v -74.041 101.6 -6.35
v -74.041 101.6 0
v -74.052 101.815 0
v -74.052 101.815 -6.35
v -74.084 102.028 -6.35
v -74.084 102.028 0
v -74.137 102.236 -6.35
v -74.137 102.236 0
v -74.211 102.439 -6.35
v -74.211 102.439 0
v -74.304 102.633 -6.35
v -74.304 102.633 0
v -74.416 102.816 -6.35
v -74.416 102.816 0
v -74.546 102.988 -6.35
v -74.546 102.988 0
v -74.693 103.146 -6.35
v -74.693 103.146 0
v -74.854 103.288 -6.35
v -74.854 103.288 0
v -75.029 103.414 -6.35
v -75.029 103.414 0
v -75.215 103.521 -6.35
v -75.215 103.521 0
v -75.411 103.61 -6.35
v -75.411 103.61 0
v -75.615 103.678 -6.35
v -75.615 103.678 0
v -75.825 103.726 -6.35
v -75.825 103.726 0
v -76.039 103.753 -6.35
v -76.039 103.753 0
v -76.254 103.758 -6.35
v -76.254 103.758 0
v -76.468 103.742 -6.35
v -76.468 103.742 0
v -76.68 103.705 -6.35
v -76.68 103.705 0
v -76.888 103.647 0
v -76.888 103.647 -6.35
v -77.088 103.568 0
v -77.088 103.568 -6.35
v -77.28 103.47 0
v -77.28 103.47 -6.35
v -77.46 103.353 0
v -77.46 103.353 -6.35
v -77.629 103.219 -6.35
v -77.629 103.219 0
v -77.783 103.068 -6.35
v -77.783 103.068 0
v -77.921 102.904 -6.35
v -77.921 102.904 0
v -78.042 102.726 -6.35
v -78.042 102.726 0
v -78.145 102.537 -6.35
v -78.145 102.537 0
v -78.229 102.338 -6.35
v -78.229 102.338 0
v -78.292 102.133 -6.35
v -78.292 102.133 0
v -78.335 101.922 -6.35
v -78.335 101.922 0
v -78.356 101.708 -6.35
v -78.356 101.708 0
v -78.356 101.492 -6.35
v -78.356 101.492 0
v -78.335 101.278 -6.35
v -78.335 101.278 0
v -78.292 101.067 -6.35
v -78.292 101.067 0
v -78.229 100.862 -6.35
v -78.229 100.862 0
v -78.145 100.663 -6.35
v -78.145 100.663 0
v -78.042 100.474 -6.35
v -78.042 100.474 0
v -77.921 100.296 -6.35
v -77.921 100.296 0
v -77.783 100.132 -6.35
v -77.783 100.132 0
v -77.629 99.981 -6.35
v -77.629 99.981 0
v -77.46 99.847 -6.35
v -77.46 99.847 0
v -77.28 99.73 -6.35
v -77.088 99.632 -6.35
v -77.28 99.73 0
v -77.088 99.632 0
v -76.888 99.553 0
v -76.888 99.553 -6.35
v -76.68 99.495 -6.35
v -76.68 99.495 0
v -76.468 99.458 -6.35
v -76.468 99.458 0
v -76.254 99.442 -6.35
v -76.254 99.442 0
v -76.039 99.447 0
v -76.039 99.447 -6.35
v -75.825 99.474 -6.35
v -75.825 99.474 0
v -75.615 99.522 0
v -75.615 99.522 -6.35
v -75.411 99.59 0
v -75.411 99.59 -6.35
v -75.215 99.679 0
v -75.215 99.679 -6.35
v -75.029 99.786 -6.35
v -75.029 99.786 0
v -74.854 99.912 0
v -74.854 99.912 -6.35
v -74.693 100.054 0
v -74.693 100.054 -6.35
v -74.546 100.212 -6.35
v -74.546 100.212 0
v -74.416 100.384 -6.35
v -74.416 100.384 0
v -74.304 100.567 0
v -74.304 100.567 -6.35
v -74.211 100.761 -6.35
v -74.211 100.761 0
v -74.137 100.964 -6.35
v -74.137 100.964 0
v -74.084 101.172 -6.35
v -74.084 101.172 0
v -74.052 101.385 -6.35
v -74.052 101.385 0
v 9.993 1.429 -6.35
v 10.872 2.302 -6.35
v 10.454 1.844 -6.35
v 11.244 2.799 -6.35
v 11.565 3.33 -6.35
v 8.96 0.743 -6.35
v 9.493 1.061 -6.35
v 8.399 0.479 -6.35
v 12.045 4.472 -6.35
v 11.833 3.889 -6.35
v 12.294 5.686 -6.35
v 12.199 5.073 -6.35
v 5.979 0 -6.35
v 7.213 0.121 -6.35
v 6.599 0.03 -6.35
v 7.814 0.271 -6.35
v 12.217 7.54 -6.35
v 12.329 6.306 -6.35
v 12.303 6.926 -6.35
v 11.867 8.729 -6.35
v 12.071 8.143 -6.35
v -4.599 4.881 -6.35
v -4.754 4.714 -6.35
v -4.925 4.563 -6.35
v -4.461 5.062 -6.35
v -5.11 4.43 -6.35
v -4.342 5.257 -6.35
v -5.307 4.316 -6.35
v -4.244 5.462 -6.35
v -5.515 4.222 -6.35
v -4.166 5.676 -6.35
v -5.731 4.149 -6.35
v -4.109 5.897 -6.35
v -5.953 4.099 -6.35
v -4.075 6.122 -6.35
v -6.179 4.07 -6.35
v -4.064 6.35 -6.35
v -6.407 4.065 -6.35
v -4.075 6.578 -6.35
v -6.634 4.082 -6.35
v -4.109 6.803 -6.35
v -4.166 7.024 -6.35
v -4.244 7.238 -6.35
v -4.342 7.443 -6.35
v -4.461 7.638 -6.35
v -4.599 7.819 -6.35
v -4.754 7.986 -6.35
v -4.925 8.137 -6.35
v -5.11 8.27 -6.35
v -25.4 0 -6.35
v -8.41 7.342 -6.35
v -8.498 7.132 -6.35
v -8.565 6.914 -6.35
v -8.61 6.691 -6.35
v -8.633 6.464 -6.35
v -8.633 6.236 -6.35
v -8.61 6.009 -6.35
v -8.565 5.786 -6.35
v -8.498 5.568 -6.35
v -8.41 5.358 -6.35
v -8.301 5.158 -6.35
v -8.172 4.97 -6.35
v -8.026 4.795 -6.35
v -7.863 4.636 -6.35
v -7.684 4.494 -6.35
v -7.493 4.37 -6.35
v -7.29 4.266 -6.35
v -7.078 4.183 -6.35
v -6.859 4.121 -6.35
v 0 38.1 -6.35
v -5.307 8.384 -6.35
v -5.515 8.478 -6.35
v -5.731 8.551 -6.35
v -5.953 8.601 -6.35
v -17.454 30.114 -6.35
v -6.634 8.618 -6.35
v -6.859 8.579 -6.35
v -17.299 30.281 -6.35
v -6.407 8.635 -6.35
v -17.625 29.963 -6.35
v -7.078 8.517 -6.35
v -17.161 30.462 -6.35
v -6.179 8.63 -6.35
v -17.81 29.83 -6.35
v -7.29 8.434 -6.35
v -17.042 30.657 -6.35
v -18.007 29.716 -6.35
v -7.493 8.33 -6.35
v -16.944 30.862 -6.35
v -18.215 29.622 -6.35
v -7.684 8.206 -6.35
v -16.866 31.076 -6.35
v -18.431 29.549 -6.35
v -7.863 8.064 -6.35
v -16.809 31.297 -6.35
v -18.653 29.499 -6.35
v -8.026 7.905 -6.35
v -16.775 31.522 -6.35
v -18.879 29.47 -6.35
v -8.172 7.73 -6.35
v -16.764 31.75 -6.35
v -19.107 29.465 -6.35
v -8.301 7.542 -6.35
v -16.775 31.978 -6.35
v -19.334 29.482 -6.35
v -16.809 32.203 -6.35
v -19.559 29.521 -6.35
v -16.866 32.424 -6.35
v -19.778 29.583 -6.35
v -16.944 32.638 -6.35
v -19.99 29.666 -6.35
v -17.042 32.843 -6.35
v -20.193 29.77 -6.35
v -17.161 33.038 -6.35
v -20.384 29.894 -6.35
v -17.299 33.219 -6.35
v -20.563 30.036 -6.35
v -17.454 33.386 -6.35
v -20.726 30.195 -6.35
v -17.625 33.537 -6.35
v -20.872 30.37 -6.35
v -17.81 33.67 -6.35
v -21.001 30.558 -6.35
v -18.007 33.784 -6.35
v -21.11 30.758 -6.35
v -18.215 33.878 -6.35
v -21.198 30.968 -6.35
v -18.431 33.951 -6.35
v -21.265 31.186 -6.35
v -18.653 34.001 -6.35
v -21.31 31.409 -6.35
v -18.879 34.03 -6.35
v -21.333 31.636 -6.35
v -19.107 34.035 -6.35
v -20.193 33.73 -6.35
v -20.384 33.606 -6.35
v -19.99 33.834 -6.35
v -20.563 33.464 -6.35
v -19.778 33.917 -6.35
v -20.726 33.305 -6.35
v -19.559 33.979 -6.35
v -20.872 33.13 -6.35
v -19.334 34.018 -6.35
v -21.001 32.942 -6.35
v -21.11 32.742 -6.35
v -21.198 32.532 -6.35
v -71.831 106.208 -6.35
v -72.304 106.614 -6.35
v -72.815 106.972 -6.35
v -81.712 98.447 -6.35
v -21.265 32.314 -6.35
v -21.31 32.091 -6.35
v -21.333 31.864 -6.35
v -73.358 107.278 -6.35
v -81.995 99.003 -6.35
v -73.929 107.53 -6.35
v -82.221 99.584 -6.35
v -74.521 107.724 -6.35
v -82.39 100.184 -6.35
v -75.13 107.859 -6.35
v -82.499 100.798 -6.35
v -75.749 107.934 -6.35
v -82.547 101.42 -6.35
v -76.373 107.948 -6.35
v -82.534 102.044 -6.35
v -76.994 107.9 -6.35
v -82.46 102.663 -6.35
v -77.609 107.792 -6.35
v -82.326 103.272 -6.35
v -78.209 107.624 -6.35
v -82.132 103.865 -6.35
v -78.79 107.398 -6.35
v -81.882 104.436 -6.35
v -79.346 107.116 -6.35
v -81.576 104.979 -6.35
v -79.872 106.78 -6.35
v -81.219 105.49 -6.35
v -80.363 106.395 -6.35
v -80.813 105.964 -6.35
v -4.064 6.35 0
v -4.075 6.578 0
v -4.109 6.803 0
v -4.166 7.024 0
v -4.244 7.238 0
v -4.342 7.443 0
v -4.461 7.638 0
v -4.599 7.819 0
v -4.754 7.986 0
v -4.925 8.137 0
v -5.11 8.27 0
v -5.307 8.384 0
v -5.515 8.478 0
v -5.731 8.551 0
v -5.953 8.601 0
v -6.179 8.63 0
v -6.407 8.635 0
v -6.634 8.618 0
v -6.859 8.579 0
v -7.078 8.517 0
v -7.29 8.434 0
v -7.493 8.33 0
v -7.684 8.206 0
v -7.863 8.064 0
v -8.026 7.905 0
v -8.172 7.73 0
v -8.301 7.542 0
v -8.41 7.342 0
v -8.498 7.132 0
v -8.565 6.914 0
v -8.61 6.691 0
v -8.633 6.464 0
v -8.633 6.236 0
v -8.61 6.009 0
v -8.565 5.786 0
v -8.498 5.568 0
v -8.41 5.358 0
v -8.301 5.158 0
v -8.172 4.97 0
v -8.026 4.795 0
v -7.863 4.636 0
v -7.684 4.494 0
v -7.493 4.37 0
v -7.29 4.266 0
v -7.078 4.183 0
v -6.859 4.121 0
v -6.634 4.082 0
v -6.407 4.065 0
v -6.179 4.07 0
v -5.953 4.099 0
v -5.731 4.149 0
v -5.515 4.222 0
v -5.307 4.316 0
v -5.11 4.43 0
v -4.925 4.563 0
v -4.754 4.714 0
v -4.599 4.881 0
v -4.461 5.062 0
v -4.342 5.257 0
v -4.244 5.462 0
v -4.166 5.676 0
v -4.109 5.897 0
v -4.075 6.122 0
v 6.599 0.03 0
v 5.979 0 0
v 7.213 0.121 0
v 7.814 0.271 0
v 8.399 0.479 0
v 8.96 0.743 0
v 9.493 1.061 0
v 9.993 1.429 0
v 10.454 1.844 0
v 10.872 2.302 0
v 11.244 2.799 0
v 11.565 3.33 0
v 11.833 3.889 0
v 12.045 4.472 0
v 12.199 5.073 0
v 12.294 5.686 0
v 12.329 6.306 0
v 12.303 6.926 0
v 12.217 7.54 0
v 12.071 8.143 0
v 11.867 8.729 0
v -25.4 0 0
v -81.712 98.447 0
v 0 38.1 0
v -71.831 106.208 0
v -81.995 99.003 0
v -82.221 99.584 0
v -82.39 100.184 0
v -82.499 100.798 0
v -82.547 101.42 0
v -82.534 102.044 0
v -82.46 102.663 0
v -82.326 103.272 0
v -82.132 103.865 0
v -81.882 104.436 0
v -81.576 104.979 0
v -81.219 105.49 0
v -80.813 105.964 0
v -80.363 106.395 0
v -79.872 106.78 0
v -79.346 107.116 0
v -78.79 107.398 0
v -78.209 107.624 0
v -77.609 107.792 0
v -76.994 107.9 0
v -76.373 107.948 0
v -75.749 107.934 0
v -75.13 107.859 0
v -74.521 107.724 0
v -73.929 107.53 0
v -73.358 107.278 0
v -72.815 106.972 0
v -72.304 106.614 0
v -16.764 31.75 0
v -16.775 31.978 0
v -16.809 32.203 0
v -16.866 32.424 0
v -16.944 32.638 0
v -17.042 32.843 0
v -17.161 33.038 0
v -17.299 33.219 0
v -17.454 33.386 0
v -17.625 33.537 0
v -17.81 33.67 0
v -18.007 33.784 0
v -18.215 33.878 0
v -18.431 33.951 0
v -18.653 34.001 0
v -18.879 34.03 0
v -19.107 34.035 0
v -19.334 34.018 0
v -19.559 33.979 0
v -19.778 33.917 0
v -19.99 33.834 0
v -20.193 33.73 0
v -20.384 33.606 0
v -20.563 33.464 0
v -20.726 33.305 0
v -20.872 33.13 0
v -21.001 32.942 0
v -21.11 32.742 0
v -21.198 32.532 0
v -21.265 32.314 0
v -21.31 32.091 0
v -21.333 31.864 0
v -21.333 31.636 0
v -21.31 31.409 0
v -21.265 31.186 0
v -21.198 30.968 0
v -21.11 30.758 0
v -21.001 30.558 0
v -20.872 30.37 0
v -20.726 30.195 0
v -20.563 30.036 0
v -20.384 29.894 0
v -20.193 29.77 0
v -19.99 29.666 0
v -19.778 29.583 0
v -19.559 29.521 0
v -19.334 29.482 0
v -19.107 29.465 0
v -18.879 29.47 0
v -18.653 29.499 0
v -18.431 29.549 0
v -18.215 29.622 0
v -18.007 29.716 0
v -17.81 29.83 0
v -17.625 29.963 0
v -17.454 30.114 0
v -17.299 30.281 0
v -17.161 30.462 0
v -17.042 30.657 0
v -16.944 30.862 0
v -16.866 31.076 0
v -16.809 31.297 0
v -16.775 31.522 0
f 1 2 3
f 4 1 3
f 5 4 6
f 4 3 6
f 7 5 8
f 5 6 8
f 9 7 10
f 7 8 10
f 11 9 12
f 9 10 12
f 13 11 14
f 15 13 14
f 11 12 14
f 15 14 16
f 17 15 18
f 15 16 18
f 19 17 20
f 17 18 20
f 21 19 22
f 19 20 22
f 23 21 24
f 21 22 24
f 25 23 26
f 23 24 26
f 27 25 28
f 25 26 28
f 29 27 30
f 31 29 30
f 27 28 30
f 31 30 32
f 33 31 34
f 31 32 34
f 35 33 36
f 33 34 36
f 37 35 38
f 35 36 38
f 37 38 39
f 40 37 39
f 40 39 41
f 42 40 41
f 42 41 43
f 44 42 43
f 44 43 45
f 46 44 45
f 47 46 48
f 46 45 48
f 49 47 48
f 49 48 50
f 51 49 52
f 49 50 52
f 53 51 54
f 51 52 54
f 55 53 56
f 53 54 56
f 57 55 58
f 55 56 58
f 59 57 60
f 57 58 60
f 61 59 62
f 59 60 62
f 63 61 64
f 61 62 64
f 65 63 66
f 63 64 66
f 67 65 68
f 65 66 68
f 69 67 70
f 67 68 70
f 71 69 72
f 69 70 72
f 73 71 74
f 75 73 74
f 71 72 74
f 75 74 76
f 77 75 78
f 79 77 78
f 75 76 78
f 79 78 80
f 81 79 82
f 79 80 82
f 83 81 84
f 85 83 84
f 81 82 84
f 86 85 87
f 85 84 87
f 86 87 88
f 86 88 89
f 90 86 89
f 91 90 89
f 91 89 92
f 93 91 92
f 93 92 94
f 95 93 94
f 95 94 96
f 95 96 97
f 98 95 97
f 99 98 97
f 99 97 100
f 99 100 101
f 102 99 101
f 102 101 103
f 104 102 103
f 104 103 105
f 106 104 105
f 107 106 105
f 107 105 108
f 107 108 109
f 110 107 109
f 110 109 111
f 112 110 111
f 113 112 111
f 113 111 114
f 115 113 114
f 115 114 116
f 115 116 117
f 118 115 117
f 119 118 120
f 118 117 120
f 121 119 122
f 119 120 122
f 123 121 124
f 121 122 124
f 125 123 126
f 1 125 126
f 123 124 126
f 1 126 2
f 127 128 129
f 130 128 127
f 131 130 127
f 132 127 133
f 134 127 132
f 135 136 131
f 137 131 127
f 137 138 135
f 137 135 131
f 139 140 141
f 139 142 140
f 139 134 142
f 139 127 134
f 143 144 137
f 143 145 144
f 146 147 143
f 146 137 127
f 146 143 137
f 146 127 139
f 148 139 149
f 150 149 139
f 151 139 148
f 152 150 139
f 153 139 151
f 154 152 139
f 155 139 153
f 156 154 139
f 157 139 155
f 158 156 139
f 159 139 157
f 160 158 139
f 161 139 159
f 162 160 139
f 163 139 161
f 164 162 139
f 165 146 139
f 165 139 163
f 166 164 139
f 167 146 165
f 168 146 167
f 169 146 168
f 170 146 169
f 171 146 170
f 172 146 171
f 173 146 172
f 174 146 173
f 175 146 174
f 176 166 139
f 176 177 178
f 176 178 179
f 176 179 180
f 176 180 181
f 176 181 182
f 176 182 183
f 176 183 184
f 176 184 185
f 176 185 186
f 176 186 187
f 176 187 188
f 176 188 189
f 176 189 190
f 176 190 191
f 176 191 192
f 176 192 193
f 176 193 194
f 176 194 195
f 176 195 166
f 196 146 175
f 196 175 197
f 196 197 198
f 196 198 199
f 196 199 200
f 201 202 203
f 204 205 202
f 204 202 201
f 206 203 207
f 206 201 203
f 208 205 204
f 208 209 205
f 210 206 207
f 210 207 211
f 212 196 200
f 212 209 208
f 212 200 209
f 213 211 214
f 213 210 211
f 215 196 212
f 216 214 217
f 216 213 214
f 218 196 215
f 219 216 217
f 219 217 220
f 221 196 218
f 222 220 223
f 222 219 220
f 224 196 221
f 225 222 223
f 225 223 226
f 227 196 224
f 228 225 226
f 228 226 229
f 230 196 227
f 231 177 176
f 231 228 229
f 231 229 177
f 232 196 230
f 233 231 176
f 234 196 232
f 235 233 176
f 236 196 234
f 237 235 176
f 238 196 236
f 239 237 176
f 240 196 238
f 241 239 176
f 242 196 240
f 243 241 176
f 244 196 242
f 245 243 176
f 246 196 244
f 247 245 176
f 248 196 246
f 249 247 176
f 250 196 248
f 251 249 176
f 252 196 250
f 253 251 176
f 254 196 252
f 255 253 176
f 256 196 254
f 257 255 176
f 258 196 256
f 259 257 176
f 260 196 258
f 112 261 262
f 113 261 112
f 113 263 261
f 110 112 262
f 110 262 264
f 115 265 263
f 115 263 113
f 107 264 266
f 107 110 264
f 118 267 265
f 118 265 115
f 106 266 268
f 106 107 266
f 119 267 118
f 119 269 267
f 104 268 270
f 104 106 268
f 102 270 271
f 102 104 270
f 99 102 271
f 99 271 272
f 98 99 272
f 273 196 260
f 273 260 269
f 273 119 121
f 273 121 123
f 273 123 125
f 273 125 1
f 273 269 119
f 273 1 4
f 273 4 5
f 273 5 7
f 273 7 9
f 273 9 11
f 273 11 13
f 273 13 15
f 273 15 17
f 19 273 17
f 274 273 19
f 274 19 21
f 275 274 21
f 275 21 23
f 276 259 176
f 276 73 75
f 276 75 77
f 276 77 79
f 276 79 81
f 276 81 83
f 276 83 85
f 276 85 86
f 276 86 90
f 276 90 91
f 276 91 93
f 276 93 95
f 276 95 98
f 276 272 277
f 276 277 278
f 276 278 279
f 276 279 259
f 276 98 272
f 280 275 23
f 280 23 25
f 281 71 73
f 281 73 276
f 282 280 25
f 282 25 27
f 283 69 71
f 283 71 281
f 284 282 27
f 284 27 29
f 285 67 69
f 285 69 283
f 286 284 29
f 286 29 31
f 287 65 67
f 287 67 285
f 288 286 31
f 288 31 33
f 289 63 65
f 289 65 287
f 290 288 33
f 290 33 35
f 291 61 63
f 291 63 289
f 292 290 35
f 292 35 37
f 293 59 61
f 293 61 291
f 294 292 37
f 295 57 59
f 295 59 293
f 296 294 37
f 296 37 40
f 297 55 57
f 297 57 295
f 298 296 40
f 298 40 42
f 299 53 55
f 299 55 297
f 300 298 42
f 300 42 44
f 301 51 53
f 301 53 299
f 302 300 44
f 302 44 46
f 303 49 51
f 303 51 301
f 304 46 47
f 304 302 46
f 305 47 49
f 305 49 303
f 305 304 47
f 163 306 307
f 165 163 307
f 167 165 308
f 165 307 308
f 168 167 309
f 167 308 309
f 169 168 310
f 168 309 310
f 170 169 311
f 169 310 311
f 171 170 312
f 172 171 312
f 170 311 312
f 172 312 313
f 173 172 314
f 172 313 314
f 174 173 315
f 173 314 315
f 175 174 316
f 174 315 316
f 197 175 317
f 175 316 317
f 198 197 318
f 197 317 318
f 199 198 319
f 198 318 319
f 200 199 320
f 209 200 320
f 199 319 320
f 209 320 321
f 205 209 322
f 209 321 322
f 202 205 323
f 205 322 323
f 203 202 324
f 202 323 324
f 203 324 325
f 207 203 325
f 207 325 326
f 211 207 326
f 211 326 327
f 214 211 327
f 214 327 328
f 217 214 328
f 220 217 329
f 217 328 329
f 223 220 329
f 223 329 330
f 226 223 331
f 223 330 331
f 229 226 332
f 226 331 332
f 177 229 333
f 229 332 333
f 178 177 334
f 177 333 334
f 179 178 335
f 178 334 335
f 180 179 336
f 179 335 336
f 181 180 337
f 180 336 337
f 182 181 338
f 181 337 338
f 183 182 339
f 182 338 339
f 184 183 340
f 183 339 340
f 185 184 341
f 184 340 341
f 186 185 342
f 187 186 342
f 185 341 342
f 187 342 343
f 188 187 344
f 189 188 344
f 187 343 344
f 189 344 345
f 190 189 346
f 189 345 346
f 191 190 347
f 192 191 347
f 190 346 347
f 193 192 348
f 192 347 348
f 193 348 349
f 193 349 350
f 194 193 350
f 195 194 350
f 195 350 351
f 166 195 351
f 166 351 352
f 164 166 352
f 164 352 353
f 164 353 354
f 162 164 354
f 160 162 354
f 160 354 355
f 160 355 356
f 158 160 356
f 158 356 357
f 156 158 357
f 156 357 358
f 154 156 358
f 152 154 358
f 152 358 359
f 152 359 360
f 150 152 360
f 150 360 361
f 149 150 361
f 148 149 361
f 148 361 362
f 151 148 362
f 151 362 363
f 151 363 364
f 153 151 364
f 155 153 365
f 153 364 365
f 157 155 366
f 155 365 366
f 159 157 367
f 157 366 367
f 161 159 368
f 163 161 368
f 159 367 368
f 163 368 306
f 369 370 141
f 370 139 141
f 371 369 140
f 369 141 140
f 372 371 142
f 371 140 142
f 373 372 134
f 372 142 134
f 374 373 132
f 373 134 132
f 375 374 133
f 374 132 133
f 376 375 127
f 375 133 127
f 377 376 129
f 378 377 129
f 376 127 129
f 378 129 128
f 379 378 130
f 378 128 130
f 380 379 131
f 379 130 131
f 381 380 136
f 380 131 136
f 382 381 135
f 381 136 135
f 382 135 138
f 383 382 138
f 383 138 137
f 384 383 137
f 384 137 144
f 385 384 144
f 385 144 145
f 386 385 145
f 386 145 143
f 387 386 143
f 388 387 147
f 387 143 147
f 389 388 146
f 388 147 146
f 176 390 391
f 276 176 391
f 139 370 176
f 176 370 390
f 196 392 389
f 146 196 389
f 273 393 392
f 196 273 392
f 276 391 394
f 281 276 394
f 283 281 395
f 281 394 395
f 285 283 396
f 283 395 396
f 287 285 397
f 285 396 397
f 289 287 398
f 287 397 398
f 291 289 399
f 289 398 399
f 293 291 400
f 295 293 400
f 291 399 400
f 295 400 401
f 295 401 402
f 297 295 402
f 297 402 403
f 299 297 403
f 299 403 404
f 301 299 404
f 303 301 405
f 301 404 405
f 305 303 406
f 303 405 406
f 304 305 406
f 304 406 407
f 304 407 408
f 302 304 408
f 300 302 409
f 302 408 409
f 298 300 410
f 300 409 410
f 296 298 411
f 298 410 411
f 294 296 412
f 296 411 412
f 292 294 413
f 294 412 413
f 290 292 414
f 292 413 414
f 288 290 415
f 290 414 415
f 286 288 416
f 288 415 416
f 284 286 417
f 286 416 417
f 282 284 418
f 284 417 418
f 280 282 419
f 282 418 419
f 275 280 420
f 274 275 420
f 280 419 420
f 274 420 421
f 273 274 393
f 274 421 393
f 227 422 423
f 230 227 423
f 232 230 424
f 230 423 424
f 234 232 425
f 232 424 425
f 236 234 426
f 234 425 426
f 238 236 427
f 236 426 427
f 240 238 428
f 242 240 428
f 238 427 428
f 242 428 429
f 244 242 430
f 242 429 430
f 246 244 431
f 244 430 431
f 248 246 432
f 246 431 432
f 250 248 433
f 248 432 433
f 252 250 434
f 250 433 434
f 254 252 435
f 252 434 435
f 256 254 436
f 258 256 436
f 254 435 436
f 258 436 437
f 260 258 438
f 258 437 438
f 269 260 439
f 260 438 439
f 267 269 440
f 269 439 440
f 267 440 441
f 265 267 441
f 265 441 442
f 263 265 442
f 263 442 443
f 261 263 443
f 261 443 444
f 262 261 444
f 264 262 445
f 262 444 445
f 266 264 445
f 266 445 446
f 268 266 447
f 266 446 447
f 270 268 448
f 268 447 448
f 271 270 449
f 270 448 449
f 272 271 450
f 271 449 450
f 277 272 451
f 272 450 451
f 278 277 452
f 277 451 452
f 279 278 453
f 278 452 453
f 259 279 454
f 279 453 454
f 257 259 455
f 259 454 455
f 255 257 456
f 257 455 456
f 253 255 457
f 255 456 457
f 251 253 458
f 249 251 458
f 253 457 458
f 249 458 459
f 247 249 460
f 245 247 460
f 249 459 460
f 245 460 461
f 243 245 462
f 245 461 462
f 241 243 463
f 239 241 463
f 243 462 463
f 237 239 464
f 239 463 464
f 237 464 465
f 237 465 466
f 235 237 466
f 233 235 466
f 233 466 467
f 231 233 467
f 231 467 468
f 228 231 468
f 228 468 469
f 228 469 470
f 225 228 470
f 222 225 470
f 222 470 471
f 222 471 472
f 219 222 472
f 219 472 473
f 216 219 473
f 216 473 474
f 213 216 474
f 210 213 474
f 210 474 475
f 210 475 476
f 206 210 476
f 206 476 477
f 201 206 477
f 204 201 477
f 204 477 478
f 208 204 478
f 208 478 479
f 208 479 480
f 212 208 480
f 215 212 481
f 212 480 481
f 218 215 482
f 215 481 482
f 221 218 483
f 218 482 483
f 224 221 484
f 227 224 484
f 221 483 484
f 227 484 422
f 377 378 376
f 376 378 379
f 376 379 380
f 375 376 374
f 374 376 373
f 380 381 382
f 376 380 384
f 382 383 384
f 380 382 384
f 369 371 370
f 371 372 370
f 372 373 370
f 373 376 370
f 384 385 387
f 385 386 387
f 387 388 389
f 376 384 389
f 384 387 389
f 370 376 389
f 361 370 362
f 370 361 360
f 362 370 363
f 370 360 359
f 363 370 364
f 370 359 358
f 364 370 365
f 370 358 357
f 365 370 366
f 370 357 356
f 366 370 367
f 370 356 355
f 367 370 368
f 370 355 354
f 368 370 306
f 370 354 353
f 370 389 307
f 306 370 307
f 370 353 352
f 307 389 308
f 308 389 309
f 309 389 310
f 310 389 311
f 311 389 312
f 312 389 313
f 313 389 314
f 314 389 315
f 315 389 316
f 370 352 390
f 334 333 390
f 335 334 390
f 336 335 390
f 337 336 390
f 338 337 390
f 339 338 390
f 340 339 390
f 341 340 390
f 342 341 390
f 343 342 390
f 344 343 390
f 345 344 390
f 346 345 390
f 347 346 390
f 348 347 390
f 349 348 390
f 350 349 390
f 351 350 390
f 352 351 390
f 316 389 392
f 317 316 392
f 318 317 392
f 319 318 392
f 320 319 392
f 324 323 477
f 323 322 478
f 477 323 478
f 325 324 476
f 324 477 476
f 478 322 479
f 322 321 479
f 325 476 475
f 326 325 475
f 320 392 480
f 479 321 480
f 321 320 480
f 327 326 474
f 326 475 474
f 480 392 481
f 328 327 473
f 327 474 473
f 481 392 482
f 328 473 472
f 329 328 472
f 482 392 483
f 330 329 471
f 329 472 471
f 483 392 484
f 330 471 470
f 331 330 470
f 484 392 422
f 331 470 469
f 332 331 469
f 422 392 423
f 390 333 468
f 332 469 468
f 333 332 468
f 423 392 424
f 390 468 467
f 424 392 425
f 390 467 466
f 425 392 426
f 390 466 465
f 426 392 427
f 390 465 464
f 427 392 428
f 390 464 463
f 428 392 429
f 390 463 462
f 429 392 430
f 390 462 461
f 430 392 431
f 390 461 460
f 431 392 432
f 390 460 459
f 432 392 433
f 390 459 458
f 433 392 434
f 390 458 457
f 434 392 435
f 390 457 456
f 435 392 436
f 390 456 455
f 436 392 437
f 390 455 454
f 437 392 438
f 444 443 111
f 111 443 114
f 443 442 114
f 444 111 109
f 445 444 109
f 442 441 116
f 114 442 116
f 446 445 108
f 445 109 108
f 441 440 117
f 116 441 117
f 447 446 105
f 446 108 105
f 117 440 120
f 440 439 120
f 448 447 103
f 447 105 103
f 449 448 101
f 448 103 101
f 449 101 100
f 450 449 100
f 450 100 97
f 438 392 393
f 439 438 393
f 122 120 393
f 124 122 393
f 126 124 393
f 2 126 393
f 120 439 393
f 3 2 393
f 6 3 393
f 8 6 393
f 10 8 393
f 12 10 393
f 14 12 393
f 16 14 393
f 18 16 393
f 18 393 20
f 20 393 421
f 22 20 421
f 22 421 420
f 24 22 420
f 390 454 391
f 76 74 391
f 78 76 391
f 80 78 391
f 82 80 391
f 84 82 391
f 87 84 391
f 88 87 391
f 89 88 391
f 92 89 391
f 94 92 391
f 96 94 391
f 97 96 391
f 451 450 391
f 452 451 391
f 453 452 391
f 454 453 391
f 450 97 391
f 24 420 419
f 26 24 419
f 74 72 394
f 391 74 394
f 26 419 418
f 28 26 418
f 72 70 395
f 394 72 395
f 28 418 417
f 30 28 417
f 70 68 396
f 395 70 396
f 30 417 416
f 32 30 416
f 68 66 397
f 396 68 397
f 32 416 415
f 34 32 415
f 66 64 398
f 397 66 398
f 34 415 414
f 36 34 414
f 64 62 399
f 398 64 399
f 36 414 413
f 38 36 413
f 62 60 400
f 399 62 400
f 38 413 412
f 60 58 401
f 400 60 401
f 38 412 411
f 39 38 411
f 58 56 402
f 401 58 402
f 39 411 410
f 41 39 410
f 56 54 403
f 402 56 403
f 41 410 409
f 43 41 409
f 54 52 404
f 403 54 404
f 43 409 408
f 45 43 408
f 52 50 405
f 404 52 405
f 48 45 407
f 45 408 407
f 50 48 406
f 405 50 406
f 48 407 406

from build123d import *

# Parameters (mm, degrees)
SKETCH1_R           = 2.286
SKETCH1_R_2         = 2.159
BOSS_EXTRUDE1_DEPTH = 6.35
FILLET1_R           = 6.35


with BuildPart() as part:
    # Sketch1 → Boss-Extrude1 (new body)
    with BuildSketch(Plane.XY):
        with BuildLine():
            Line((0, 0), (-25.4, 0))
            Line((-25.4, 0), (-81.711981324, 98.447134338))
            ThreePointArc((-81.711981324, 98.447134338), (-80.122257521, 106.593835794), (-71.830872801, 106.207952639))
            Line((-71.830872801, 106.207952639), (0, 38.1))
            Line((0, 38.1), (15.393399204, 0))
            Line((15.393399204, 0), (0, 0))
        make_face()
        with Locations((-6.35, 6.35)):
            Circle(SKETCH1_R, mode=Mode.SUBTRACT)
        with Locations((-19.05, 31.75)):
            Circle(SKETCH1_R, mode=Mode.SUBTRACT)
        with Locations((-76.2, 101.6)):
            Circle(SKETCH1_R_2, mode=Mode.SUBTRACT)
    extrude(amount=-BOSS_EXTRUDE1_DEPTH)

    # Fillet1
    fillet1_edges = [part.edges().sort_by_distance(p)[0] for p in [
        (15.393399204, 0, -3.175),
    ]]
    fillet(fillet1_edges, radius=FILLET1_R)


solid = part.part
